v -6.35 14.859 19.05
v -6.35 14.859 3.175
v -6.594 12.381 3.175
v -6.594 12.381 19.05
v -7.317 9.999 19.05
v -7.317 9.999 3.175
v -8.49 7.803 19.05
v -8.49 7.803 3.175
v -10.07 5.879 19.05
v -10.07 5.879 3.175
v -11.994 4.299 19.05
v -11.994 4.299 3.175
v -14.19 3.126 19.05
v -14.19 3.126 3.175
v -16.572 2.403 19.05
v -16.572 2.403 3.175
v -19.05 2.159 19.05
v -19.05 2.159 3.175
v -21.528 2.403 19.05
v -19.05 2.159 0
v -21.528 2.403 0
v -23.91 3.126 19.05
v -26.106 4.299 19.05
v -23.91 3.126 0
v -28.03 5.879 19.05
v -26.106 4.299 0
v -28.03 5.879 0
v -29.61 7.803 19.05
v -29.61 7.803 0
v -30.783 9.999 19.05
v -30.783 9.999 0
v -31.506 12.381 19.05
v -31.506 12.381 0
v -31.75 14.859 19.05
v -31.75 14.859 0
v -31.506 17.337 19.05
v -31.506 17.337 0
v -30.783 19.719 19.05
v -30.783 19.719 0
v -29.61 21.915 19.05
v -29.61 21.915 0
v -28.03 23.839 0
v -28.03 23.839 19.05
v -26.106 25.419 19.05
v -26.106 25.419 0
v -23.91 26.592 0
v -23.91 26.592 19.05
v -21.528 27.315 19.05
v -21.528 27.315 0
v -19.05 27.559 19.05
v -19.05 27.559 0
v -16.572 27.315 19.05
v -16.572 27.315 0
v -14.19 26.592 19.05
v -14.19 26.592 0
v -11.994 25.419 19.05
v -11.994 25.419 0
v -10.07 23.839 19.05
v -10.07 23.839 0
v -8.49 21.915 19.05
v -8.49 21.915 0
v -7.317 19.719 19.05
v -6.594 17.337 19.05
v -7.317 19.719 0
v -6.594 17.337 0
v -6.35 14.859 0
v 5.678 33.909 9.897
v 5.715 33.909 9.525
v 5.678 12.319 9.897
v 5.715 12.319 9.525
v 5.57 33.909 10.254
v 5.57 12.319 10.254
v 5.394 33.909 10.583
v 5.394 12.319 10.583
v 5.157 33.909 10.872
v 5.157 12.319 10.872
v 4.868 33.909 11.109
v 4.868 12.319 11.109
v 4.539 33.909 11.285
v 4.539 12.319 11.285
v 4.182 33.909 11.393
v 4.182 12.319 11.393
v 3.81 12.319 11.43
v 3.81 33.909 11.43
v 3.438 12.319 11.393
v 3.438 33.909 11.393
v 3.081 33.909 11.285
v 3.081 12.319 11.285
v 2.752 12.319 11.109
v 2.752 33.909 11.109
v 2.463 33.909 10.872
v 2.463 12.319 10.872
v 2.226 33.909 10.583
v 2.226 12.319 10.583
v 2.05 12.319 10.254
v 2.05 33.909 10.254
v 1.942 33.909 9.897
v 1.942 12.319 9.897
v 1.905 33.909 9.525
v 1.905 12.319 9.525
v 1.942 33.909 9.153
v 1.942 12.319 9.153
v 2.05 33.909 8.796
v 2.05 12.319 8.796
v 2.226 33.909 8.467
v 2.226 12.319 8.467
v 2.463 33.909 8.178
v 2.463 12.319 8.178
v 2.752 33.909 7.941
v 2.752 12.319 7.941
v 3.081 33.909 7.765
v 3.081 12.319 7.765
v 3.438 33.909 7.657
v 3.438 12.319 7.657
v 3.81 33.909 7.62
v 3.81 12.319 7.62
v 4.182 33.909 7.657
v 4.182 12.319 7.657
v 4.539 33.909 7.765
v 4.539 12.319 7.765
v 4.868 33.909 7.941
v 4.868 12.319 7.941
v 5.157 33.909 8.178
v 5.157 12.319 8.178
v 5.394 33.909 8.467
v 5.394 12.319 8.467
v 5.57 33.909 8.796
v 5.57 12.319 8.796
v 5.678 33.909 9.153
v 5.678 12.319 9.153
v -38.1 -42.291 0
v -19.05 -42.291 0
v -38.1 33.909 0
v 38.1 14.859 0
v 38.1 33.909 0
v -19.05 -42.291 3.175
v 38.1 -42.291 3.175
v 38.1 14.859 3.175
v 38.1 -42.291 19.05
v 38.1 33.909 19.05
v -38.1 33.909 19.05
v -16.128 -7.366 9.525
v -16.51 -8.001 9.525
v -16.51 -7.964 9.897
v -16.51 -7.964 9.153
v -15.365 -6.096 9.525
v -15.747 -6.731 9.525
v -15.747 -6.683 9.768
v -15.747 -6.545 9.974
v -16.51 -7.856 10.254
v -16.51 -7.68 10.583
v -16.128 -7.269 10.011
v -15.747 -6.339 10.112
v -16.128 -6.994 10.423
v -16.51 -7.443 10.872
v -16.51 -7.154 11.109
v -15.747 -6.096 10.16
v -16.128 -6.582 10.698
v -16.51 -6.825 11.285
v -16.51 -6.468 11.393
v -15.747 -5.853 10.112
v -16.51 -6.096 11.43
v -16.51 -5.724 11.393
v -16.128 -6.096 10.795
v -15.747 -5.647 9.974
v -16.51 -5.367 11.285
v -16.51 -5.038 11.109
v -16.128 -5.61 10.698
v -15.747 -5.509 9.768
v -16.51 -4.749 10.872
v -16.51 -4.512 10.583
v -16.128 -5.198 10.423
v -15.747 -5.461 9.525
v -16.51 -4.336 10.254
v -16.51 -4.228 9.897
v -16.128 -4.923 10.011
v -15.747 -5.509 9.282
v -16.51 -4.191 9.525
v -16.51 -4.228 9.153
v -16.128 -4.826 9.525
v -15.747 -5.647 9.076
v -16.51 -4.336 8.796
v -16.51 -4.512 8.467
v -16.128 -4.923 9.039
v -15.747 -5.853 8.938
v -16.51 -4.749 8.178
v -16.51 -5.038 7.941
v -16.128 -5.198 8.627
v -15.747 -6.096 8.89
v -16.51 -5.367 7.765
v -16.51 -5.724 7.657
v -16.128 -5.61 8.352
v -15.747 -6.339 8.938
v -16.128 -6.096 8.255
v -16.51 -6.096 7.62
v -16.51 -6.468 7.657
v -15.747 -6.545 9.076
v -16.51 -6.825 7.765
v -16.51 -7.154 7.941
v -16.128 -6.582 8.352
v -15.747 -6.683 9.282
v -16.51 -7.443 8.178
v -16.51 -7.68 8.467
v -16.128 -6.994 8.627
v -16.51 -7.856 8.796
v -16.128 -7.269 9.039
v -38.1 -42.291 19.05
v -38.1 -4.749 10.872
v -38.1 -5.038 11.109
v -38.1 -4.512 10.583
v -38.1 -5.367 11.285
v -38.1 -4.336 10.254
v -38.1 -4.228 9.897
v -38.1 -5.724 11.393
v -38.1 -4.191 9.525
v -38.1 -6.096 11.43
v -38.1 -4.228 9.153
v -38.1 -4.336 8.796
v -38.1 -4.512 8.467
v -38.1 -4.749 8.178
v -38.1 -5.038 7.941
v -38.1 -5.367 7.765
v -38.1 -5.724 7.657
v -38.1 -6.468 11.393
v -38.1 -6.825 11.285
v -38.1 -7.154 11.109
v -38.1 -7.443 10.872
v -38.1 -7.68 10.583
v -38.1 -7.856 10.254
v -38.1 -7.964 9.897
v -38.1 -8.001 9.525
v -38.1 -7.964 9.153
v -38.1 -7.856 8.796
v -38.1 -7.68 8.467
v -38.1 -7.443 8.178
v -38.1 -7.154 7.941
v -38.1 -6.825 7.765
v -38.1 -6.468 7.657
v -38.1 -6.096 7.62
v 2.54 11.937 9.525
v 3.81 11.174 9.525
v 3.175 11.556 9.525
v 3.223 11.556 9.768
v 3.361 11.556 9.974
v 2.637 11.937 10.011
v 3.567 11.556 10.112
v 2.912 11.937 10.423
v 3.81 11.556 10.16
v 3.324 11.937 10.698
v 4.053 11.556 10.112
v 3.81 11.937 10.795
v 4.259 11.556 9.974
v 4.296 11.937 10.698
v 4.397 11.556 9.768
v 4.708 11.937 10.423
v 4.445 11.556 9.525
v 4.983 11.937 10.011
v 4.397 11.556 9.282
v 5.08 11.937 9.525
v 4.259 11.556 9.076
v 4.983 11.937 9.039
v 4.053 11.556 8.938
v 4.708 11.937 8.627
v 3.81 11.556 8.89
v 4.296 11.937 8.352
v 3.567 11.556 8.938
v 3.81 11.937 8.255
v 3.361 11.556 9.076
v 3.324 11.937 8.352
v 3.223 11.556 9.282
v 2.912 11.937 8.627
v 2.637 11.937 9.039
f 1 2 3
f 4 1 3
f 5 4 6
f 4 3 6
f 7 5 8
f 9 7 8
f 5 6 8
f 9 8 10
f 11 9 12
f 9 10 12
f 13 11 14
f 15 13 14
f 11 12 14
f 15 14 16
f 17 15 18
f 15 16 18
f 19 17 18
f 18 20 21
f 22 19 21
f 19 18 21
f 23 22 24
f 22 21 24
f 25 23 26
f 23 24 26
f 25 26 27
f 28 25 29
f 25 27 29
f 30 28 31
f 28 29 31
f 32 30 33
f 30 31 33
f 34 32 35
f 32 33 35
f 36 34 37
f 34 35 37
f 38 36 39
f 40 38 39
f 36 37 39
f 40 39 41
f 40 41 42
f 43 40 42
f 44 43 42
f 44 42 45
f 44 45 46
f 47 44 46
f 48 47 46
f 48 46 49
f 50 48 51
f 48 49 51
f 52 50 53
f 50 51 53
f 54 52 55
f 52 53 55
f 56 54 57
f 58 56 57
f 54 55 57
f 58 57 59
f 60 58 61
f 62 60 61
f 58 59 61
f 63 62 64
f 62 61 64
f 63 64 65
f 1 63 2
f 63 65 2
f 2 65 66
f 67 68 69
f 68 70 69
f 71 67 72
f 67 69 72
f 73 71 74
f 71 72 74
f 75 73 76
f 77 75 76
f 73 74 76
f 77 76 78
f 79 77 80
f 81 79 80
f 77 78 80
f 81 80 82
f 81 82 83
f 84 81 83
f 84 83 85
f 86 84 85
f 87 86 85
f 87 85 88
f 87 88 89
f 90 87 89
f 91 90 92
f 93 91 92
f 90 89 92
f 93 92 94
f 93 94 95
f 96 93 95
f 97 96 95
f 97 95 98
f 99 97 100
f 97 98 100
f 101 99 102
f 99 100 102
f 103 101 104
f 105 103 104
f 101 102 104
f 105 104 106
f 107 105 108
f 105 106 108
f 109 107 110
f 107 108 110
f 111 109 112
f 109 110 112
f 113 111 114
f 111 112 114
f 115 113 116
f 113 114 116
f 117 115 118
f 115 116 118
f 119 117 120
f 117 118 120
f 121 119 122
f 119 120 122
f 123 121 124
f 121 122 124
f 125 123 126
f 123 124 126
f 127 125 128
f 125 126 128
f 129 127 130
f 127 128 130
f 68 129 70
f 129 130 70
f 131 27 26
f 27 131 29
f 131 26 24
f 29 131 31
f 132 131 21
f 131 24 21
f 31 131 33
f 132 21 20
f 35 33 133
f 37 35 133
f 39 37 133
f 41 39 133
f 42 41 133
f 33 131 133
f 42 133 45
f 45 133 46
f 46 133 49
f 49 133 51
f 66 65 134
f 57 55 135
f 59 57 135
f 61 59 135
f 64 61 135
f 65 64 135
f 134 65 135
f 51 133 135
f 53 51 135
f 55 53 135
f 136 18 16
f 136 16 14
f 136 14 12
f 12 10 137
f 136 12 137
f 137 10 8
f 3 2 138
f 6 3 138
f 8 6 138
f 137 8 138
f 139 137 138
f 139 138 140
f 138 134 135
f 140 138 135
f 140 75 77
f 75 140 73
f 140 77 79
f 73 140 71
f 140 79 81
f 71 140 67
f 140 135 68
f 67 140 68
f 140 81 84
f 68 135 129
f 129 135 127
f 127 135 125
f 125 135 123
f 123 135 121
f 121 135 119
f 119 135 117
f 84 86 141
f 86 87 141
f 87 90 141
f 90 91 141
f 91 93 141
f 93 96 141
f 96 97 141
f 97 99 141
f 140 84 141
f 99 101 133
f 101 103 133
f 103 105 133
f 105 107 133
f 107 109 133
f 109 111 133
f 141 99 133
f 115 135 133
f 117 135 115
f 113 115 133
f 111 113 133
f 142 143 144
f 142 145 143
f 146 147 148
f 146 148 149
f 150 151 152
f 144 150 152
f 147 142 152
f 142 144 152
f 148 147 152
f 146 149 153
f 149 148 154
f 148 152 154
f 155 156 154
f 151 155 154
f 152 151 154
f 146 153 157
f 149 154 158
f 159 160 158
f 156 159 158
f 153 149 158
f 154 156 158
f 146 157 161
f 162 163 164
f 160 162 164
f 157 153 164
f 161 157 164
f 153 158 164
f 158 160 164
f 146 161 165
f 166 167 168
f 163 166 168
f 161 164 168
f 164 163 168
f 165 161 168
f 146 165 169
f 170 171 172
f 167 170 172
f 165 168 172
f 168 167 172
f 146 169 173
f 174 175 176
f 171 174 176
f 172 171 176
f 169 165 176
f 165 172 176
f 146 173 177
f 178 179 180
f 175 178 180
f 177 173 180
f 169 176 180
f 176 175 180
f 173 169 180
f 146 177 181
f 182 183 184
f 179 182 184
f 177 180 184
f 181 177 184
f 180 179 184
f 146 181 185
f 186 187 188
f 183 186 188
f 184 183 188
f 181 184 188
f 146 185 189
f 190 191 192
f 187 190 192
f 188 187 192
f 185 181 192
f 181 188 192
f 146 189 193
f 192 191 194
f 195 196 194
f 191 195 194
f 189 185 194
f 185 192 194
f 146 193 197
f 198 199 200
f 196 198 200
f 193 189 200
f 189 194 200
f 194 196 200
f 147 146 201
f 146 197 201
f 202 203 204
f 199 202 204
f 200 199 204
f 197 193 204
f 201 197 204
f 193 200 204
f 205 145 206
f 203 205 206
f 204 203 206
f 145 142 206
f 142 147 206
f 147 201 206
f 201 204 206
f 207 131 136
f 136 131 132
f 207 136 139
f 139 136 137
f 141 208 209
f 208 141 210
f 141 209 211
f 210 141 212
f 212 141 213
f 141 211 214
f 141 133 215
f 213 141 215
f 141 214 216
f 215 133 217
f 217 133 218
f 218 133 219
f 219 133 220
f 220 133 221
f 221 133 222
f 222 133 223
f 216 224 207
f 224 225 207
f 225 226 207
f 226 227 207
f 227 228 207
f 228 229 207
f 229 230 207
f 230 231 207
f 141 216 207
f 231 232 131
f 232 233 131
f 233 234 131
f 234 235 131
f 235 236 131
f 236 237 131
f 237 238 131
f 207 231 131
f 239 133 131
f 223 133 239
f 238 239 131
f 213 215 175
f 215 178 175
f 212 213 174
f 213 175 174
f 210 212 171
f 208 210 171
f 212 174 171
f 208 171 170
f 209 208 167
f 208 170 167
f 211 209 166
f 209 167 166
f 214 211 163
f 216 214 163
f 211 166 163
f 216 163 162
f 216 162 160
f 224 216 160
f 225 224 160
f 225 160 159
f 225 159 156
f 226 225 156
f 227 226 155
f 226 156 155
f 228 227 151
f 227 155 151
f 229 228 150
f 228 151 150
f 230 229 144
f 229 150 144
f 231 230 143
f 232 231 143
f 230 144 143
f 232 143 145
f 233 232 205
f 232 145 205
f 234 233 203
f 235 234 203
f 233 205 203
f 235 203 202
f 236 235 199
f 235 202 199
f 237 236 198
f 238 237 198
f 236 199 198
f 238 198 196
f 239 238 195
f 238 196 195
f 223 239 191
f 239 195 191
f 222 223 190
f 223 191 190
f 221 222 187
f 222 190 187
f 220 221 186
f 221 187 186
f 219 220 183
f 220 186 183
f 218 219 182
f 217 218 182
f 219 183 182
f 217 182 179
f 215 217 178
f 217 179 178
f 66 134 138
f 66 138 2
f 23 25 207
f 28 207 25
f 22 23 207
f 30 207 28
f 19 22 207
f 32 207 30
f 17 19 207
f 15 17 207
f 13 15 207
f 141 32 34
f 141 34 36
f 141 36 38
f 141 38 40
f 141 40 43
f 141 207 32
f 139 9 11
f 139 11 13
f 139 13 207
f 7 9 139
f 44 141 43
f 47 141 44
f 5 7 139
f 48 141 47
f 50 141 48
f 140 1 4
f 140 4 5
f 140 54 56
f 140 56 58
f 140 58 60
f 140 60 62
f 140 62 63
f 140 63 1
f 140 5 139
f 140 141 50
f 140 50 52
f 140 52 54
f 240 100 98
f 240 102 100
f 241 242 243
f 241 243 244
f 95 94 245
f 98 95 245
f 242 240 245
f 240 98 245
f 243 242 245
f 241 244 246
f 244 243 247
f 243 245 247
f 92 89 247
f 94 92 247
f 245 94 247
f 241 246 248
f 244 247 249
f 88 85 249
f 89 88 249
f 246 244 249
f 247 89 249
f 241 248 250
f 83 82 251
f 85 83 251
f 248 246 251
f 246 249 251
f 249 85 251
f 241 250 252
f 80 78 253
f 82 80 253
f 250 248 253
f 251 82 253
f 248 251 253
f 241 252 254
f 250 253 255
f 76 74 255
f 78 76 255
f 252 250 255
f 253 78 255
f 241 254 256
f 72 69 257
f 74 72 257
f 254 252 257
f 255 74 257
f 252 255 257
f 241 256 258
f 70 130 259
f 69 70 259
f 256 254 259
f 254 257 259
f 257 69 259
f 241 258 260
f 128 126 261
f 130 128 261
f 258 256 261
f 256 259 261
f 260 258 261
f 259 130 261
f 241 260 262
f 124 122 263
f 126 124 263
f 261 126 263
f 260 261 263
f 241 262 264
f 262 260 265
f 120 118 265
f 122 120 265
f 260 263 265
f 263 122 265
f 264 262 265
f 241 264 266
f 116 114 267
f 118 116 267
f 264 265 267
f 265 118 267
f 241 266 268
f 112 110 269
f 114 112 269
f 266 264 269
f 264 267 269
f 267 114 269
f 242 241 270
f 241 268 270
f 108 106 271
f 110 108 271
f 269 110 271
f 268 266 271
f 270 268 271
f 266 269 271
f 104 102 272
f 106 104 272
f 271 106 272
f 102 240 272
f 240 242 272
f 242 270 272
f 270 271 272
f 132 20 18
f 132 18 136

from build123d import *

# Parameters (mm, degrees)
F1_DEPTH = 19.05
F2_DEPTH = 3.175
F4_D     = 3.81
F4_DEPTH = 21.59
F4_TIP   = 1.1446394792
F6_D     = 3.81
F6_DEPTH = 21.59
F6_TIP   = 1.1446394792


with BuildPart() as f1:
    # F0 (on Top) → F1 (new body)
    with BuildSketch(Plane.XY):
        with BuildLine():
            Line((38.1, -42.2910004854), (38.1, 14.8589995146))
            Line((38.1, 14.8589995146), (-6.3500002354, 14.8589995146))
            ThreePointArc((-6.3500002354, 14.8589995146), (-10.0697441144, 5.8787433935), (-19.0500002354, 2.1589995146))
            Line((-19.0500002354, 2.1589995146), (-19.0500002354, -42.2910004854))
            Line((-19.0500002354, -42.2910004854), (38.1, -42.2910004854))
        make_face()
        with BuildLine():
            Line((38.1, 14.8589995146), (38.1, 33.9089995146))
            Line((38.1, 33.9089995146), (-38.1, 33.9089995146))
            Line((-38.1, 33.9089995146), (-38.1, -42.2910004854))
            Line((-38.1, -42.2910004854), (-19.0500002354, -42.2910004854))
            Line((-19.0500002354, -42.2910004854), (-19.0500002354, 2.1589995146))
            ThreePointArc((-19.0500002354, 2.1589995146), (-28.0302563565, 23.8392556356), (-6.3500002354, 14.8589995146))
            Line((-6.3500002354, 14.8589995146), (38.1, 14.8589995146))
        make_face()
    extrude(amount=F1_DEPTH)

    # F0 (on Top) → F2 (cut)
    with BuildSketch(Plane.XY):
        with BuildLine():
            Line((38.1, -42.2910004854), (38.1, 14.8589995146))
            Line((38.1, 14.8589995146), (-6.3500002354, 14.8589995146))
            ThreePointArc((-6.3500002354, 14.8589995146), (-10.0697441144, 5.8787433935), (-19.0500002354, 2.1589995146))
            Line((-19.0500002354, 2.1589995146), (-19.0500002354, -42.2910004854))
            Line((-19.0500002354, -42.2910004854), (38.1, -42.2910004854))
        make_face()
    extrude(amount=F2_DEPTH, mode=Mode.SUBTRACT)

    # F4
    with Locations(Plane(origin=(-38.1, 0, 0), x_dir=(0, -1, 0), z_dir=(-1, 0, 0))):
        with Locations((6.0960004854, 9.525)):
            Hole(F4_D / 2, depth=F4_DEPTH)
            with Locations((0, 0, -(F4_DEPTH + F4_TIP / 2))):  # 118° drill point
                Cone(0, F4_D / 2, F4_TIP, mode=Mode.SUBTRACT)

    # F6
    with Locations(Plane(origin=(0, 33.9089995146, 0), x_dir=(-1, 0, 0), z_dir=(0, 1, 0))):
        with Locations((-3.81, 9.525)):
            Hole(F6_D / 2, depth=F6_DEPTH)
            with Locations((0, 0, -(F6_DEPTH + F6_TIP / 2))):  # 118° drill point
                Cone(0, F6_D / 2, F6_TIP, mode=Mode.SUBTRACT)


solid = f1.part
